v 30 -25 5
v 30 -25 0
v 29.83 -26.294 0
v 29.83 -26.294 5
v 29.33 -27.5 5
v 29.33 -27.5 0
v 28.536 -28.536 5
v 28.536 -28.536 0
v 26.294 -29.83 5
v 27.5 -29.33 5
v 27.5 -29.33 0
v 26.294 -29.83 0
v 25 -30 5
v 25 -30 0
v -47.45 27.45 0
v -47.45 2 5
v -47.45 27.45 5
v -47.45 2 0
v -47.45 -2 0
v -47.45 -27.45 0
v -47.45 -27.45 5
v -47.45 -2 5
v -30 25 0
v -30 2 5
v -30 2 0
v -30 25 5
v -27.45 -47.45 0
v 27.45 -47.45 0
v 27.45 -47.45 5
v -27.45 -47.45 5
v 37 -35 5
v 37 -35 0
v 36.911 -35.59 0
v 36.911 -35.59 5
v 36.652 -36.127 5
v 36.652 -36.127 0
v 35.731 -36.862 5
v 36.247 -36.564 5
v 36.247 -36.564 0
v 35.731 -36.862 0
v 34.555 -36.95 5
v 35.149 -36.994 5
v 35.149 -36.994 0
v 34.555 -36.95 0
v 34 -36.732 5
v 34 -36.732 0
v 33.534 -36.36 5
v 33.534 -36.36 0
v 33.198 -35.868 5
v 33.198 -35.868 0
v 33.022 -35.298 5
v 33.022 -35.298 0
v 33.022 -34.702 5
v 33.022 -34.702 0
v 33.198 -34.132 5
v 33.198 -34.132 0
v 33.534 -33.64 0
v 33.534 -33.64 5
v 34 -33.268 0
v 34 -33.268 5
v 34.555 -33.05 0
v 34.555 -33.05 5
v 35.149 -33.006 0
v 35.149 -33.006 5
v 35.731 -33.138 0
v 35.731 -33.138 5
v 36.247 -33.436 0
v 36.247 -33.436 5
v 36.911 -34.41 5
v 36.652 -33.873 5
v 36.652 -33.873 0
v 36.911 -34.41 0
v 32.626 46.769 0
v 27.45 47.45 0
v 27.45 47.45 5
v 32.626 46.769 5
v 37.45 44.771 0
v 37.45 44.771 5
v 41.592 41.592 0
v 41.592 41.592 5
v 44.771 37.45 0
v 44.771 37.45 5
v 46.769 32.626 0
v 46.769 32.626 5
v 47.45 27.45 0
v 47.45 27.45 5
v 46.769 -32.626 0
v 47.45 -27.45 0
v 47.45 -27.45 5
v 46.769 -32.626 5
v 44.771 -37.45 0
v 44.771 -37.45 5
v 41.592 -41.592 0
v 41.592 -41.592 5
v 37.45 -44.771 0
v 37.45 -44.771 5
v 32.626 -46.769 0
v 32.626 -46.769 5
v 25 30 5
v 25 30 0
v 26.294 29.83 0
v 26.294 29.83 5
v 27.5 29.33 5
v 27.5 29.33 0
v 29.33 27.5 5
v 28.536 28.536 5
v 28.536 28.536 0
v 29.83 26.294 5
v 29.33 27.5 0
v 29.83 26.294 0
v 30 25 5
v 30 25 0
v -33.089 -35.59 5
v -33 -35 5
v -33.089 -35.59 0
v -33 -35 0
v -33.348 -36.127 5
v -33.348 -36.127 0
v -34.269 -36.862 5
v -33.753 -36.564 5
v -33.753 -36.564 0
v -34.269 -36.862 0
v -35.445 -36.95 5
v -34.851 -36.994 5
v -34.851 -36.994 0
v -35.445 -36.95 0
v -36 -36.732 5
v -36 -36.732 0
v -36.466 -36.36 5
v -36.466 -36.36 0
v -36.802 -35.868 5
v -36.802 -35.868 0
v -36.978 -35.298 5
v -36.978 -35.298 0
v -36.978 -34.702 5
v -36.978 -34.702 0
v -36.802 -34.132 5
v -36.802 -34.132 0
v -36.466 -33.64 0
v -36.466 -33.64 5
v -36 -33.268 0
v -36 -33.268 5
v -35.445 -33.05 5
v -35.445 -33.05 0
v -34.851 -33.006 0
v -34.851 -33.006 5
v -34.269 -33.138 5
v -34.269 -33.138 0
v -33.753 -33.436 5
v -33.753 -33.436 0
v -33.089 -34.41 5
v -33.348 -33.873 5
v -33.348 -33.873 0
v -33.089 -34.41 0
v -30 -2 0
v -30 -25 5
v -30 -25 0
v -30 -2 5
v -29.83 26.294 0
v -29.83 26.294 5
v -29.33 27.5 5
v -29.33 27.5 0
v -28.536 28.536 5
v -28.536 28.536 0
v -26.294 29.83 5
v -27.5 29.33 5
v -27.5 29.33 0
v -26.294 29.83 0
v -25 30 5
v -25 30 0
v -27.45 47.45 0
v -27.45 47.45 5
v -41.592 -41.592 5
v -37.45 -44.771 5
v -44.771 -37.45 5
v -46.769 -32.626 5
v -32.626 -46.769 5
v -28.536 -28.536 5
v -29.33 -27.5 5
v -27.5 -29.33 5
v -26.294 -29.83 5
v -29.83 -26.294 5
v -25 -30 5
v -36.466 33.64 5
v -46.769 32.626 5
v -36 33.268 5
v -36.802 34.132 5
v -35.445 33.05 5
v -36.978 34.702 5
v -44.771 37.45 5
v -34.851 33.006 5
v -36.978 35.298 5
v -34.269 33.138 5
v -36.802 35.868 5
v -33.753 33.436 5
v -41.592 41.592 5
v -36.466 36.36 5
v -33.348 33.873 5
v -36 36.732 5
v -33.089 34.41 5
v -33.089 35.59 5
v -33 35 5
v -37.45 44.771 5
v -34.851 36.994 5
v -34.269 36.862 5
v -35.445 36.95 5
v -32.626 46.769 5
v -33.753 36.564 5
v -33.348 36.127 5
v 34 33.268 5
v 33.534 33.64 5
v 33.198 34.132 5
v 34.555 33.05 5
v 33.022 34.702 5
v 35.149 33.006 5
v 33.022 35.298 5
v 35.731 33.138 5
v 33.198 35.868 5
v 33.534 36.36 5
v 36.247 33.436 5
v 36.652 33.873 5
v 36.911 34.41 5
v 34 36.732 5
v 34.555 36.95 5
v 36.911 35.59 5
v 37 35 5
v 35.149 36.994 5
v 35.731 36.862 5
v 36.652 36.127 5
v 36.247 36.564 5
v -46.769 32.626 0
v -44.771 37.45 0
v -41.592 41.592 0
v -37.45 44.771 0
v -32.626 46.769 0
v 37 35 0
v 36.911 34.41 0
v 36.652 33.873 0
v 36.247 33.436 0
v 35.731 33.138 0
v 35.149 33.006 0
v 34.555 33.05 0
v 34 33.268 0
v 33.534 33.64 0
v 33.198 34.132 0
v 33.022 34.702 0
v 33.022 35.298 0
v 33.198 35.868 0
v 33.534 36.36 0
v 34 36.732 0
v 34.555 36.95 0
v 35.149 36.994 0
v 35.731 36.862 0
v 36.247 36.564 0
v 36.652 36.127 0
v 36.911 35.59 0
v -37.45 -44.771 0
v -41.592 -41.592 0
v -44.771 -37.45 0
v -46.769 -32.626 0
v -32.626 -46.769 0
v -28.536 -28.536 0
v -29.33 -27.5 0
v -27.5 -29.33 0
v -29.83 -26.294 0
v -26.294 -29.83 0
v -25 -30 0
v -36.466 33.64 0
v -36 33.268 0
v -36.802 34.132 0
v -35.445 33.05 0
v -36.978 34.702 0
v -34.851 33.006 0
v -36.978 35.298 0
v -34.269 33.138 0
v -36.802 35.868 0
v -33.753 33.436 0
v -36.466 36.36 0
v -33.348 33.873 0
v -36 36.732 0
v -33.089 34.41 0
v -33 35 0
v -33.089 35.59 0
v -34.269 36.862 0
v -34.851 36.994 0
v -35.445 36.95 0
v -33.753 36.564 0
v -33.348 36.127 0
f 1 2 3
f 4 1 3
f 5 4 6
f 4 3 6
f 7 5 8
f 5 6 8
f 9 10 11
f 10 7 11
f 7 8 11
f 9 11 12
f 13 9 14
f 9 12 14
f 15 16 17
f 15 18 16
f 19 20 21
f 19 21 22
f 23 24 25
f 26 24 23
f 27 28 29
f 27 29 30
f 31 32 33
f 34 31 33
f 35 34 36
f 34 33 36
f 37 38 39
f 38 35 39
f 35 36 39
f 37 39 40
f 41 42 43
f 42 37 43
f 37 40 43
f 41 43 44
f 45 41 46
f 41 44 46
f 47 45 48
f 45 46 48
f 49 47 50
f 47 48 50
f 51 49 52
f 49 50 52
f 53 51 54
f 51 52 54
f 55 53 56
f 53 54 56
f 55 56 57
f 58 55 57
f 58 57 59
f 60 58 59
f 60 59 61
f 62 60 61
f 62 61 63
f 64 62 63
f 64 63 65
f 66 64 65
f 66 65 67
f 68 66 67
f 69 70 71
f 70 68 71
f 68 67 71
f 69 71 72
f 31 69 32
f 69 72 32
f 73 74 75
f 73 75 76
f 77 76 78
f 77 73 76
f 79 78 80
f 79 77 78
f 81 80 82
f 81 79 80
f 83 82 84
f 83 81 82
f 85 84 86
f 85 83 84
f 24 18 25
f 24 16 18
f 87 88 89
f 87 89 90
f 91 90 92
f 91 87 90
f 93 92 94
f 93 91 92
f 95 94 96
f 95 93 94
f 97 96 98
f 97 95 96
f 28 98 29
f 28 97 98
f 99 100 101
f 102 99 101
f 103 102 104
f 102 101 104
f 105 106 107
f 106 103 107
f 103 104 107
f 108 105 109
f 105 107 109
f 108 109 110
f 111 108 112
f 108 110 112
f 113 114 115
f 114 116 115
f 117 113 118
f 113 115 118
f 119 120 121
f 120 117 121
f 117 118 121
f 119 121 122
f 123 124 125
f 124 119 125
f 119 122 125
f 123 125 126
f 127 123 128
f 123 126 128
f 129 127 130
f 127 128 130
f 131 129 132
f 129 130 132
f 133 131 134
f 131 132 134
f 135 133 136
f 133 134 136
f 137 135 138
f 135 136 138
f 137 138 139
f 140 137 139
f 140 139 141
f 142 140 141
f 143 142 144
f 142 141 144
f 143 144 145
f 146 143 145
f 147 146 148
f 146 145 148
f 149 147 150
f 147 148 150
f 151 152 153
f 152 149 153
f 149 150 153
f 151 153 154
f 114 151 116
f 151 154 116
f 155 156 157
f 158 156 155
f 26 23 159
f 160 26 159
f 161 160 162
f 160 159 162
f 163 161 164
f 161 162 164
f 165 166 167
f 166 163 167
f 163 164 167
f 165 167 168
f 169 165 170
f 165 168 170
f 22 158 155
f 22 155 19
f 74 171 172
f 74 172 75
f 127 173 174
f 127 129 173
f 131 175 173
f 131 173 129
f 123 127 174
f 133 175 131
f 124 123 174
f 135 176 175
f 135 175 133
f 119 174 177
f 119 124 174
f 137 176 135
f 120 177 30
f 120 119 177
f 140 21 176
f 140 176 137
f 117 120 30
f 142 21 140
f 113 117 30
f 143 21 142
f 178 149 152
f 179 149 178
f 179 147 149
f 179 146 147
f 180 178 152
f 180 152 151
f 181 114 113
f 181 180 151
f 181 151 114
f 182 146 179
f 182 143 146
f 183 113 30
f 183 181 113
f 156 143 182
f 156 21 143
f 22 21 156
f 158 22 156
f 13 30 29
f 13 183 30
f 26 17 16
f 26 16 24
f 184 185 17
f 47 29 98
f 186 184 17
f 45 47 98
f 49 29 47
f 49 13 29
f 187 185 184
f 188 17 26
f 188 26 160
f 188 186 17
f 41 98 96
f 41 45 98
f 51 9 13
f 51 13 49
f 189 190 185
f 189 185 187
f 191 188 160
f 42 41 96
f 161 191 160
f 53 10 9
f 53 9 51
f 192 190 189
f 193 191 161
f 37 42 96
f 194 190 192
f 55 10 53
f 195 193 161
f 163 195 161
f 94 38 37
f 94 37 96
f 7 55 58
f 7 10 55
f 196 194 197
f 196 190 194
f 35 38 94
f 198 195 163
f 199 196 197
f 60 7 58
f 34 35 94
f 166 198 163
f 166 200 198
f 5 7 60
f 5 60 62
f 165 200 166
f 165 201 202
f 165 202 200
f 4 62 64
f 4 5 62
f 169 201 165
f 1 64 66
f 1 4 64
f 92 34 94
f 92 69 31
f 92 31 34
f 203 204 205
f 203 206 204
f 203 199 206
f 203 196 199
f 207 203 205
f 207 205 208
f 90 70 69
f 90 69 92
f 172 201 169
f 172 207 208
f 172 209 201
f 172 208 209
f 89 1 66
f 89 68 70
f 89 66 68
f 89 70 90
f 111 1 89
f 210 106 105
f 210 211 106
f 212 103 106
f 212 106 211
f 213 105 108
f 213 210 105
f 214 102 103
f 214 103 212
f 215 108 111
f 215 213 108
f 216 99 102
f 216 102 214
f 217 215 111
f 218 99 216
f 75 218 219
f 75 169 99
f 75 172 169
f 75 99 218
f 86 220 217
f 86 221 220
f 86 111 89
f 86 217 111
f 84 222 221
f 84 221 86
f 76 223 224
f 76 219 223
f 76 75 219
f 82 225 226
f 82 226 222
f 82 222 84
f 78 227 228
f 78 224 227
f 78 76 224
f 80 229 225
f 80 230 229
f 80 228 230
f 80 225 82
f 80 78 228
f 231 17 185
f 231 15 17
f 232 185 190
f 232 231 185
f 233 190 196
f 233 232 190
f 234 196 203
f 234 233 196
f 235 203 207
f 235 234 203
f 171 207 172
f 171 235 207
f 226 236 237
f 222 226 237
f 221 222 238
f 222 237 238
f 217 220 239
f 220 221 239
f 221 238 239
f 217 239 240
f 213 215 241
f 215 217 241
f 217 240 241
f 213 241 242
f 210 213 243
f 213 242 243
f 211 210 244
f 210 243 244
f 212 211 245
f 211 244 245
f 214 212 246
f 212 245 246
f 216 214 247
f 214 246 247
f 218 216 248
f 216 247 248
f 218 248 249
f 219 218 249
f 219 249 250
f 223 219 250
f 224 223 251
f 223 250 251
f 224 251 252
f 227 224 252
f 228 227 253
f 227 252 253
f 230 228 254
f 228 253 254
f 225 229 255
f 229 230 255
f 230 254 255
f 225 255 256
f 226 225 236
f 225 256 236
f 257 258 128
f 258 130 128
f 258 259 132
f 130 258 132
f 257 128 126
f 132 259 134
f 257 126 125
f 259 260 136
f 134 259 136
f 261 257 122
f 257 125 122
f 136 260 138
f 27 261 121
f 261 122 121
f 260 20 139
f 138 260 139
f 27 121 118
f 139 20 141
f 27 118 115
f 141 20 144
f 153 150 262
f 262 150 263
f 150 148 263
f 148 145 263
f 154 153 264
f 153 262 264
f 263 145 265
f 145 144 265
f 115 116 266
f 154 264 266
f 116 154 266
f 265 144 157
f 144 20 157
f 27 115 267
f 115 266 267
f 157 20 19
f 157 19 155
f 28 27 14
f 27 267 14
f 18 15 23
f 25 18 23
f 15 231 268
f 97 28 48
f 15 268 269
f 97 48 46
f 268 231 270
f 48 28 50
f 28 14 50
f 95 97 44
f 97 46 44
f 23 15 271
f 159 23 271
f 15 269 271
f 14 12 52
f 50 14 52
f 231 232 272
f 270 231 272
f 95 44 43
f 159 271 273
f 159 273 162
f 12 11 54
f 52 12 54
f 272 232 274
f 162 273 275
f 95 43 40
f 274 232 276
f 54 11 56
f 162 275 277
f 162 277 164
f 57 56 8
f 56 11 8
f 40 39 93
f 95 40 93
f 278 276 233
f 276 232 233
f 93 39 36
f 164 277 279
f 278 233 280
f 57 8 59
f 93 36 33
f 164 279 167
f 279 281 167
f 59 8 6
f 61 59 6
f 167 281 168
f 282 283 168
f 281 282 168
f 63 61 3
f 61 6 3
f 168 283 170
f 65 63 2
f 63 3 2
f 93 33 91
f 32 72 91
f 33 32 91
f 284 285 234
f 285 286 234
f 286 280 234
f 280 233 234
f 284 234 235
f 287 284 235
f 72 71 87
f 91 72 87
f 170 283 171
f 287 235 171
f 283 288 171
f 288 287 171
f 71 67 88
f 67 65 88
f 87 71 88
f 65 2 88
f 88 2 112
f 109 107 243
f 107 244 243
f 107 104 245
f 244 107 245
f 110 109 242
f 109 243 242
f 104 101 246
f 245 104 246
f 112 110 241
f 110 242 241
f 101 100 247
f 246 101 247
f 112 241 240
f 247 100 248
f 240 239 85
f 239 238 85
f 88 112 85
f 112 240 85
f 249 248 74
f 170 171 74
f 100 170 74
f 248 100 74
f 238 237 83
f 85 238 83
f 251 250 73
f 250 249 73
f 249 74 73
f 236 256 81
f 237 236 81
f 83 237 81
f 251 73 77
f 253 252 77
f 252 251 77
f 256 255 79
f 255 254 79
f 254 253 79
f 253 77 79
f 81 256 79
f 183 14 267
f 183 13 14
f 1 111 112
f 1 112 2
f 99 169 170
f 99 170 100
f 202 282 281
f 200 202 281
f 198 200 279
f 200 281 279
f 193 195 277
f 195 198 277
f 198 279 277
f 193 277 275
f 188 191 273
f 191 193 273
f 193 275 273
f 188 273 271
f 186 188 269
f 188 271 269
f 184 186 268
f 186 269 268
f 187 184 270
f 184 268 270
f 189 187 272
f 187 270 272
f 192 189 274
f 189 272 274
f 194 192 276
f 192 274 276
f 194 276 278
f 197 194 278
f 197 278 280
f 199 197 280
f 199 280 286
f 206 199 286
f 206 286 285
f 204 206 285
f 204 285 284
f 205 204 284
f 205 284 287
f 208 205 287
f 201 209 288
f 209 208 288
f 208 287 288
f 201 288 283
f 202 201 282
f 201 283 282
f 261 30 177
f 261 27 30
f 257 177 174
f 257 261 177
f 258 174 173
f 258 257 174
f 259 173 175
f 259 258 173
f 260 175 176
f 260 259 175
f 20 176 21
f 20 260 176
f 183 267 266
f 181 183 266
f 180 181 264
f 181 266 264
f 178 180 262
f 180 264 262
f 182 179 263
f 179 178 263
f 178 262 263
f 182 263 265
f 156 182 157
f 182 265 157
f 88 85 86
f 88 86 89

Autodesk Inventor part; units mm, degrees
ref_plane "YZ Plane" through (0, 0, 0) normal (1, 0, 0) x (0, 1, 0)
ref_plane "XZ Plane" through (0, 0, 0) normal (0, 1, 0) x (-1, 0, 0)
ref_plane "XY Plane" through (0, 0, 0) normal (0, 0, 1) x (1, 0, 0)
sketch "Sketch1" plane through (0, 0, 0) normal (0, 0, 1) x (1, 0, 0)
  line L0 (-27.45, -52.45) -> (27.45, -52.45) construction
  line L1 (52.45, -27.45) -> (52.45, 27.45) construction
  line L2 (27.45, 52.45) -> (-27.45, 52.45) construction
  line L3 (-52.45, 27.45) -> (-52.45, -27.45) construction
  line L4 (-52.45, -52.45) -> (52.45, 52.45) construction
  line L5 (52.45, -52.45) -> (-52.45, 52.45) construction
  arc A0 (-27.45, 52.45) -> (-52.45, 27.45) centre (-27.45, 27.45) ccw construction
  arc A1 (-52.45, -27.45) -> (-27.45, -52.45) centre (-27.45, -27.45) ccw construction
  arc A2 (27.45, -52.45) -> (52.45, -27.45) centre (27.45, -27.45) ccw construction
  arc A3 (52.45, 27.45) -> (27.45, 52.45) centre (27.45, 27.45) ccw construction
  line L6 (47.45, 27.45) -> (47.45, -27.45)
  arc A4 (27.45, -47.45) -> (47.45, -27.45) centre (27.45, -27.45) ccw
  line L7 (27.45, -47.45) -> (-27.45, -47.45)
  arc A5 (-47.45, -27.45) -> (-27.45, -47.45) centre (-27.45, -27.45) ccw
  line L8 (-47.45, -27.45) -> (-47.45, 27.45)
  arc A6 (-27.45, 47.45) -> (-47.45, 27.45) centre (-27.45, 27.45) ccw
  line L9 (-27.45, 47.45) -> (27.45, 47.45)
  arc A7 (47.45, 27.45) -> (27.45, 47.45) centre (27.45, 27.45) ccw
  line L10 (-35, 35) -> (35, 35) construction
  line L11 (35, 35) -> (35, -35) construction
  line L12 (35, -35) -> (-35, -35) construction
  line L13 (-35, -35) -> (-35, 35) construction
  line L14 (-35, 35) -> (35, -35) construction
  line L15 (35, 35) -> (-35, -35) construction
  circle A8 centre (35, 35) radius 2
  circle A9 centre (35, -35) radius 2
  circle A10 centre (-35, -35) radius 2
  circle A11 centre (-35, 35) radius 2
  point P0 (0, 0)
  dimension "d0" = 104.9
  dimension "d1" = 104.9
  dimension "d2" = 25
  dimension "d6" = 5
  dimension "d12" = 70
  dimension "d13" = 4
extrude "Extrusion1" add sketch "Sketch1" along normal blind 5
sketch "Sketch2" plane through (0, 0, 5) normal (0, 0, 1) x (1, 0, 0)
  line L0 (-30, 30) -> (30, 30)
  line L1 (30, 30) -> (30, -30)
  line L2 (30, -30) -> (-30, -30)
  line L3 (-30, 30) -> (30, -30) construction
  line L4 (30, 30) -> (-30, -30) construction
  line L5 (-64.9, 2) -> (-30, 2)
  line L6 (-30, -2) -> (-64.9, -2)
  line L7 (-64.9, -2) -> (-64.9, 2)
  line L8 (-47.45, 27.45) -> (-47.45, -27.45) projected
  line L9 (-64.9, 2) -> (-30, -2) construction
  line L10 (-30, 2) -> (-64.9, -2) construction
  line L11 (-30, -30) -> (-30, -2)
  line L12 (-30, 2) -> (-30, 30)
  point P0 (0, 0)
  point P1 (-47.45, 0)
  dimension "d7" = 4
  dimension "d8" = 60
  dimension "d9" = 60
extrude "Extrusion2" cut sketch "Sketch2" against normal blind 10
fillet "Fillet1" radius 5 4 edges at (30, 30, 2.5) (-30, 30, 2.5) (30, -30, 2.5) (-30, -30, 2.5)
equation "\"d1\" = d0"
equation "\"d9\" = d8"
properties part number "NewFront_H"
